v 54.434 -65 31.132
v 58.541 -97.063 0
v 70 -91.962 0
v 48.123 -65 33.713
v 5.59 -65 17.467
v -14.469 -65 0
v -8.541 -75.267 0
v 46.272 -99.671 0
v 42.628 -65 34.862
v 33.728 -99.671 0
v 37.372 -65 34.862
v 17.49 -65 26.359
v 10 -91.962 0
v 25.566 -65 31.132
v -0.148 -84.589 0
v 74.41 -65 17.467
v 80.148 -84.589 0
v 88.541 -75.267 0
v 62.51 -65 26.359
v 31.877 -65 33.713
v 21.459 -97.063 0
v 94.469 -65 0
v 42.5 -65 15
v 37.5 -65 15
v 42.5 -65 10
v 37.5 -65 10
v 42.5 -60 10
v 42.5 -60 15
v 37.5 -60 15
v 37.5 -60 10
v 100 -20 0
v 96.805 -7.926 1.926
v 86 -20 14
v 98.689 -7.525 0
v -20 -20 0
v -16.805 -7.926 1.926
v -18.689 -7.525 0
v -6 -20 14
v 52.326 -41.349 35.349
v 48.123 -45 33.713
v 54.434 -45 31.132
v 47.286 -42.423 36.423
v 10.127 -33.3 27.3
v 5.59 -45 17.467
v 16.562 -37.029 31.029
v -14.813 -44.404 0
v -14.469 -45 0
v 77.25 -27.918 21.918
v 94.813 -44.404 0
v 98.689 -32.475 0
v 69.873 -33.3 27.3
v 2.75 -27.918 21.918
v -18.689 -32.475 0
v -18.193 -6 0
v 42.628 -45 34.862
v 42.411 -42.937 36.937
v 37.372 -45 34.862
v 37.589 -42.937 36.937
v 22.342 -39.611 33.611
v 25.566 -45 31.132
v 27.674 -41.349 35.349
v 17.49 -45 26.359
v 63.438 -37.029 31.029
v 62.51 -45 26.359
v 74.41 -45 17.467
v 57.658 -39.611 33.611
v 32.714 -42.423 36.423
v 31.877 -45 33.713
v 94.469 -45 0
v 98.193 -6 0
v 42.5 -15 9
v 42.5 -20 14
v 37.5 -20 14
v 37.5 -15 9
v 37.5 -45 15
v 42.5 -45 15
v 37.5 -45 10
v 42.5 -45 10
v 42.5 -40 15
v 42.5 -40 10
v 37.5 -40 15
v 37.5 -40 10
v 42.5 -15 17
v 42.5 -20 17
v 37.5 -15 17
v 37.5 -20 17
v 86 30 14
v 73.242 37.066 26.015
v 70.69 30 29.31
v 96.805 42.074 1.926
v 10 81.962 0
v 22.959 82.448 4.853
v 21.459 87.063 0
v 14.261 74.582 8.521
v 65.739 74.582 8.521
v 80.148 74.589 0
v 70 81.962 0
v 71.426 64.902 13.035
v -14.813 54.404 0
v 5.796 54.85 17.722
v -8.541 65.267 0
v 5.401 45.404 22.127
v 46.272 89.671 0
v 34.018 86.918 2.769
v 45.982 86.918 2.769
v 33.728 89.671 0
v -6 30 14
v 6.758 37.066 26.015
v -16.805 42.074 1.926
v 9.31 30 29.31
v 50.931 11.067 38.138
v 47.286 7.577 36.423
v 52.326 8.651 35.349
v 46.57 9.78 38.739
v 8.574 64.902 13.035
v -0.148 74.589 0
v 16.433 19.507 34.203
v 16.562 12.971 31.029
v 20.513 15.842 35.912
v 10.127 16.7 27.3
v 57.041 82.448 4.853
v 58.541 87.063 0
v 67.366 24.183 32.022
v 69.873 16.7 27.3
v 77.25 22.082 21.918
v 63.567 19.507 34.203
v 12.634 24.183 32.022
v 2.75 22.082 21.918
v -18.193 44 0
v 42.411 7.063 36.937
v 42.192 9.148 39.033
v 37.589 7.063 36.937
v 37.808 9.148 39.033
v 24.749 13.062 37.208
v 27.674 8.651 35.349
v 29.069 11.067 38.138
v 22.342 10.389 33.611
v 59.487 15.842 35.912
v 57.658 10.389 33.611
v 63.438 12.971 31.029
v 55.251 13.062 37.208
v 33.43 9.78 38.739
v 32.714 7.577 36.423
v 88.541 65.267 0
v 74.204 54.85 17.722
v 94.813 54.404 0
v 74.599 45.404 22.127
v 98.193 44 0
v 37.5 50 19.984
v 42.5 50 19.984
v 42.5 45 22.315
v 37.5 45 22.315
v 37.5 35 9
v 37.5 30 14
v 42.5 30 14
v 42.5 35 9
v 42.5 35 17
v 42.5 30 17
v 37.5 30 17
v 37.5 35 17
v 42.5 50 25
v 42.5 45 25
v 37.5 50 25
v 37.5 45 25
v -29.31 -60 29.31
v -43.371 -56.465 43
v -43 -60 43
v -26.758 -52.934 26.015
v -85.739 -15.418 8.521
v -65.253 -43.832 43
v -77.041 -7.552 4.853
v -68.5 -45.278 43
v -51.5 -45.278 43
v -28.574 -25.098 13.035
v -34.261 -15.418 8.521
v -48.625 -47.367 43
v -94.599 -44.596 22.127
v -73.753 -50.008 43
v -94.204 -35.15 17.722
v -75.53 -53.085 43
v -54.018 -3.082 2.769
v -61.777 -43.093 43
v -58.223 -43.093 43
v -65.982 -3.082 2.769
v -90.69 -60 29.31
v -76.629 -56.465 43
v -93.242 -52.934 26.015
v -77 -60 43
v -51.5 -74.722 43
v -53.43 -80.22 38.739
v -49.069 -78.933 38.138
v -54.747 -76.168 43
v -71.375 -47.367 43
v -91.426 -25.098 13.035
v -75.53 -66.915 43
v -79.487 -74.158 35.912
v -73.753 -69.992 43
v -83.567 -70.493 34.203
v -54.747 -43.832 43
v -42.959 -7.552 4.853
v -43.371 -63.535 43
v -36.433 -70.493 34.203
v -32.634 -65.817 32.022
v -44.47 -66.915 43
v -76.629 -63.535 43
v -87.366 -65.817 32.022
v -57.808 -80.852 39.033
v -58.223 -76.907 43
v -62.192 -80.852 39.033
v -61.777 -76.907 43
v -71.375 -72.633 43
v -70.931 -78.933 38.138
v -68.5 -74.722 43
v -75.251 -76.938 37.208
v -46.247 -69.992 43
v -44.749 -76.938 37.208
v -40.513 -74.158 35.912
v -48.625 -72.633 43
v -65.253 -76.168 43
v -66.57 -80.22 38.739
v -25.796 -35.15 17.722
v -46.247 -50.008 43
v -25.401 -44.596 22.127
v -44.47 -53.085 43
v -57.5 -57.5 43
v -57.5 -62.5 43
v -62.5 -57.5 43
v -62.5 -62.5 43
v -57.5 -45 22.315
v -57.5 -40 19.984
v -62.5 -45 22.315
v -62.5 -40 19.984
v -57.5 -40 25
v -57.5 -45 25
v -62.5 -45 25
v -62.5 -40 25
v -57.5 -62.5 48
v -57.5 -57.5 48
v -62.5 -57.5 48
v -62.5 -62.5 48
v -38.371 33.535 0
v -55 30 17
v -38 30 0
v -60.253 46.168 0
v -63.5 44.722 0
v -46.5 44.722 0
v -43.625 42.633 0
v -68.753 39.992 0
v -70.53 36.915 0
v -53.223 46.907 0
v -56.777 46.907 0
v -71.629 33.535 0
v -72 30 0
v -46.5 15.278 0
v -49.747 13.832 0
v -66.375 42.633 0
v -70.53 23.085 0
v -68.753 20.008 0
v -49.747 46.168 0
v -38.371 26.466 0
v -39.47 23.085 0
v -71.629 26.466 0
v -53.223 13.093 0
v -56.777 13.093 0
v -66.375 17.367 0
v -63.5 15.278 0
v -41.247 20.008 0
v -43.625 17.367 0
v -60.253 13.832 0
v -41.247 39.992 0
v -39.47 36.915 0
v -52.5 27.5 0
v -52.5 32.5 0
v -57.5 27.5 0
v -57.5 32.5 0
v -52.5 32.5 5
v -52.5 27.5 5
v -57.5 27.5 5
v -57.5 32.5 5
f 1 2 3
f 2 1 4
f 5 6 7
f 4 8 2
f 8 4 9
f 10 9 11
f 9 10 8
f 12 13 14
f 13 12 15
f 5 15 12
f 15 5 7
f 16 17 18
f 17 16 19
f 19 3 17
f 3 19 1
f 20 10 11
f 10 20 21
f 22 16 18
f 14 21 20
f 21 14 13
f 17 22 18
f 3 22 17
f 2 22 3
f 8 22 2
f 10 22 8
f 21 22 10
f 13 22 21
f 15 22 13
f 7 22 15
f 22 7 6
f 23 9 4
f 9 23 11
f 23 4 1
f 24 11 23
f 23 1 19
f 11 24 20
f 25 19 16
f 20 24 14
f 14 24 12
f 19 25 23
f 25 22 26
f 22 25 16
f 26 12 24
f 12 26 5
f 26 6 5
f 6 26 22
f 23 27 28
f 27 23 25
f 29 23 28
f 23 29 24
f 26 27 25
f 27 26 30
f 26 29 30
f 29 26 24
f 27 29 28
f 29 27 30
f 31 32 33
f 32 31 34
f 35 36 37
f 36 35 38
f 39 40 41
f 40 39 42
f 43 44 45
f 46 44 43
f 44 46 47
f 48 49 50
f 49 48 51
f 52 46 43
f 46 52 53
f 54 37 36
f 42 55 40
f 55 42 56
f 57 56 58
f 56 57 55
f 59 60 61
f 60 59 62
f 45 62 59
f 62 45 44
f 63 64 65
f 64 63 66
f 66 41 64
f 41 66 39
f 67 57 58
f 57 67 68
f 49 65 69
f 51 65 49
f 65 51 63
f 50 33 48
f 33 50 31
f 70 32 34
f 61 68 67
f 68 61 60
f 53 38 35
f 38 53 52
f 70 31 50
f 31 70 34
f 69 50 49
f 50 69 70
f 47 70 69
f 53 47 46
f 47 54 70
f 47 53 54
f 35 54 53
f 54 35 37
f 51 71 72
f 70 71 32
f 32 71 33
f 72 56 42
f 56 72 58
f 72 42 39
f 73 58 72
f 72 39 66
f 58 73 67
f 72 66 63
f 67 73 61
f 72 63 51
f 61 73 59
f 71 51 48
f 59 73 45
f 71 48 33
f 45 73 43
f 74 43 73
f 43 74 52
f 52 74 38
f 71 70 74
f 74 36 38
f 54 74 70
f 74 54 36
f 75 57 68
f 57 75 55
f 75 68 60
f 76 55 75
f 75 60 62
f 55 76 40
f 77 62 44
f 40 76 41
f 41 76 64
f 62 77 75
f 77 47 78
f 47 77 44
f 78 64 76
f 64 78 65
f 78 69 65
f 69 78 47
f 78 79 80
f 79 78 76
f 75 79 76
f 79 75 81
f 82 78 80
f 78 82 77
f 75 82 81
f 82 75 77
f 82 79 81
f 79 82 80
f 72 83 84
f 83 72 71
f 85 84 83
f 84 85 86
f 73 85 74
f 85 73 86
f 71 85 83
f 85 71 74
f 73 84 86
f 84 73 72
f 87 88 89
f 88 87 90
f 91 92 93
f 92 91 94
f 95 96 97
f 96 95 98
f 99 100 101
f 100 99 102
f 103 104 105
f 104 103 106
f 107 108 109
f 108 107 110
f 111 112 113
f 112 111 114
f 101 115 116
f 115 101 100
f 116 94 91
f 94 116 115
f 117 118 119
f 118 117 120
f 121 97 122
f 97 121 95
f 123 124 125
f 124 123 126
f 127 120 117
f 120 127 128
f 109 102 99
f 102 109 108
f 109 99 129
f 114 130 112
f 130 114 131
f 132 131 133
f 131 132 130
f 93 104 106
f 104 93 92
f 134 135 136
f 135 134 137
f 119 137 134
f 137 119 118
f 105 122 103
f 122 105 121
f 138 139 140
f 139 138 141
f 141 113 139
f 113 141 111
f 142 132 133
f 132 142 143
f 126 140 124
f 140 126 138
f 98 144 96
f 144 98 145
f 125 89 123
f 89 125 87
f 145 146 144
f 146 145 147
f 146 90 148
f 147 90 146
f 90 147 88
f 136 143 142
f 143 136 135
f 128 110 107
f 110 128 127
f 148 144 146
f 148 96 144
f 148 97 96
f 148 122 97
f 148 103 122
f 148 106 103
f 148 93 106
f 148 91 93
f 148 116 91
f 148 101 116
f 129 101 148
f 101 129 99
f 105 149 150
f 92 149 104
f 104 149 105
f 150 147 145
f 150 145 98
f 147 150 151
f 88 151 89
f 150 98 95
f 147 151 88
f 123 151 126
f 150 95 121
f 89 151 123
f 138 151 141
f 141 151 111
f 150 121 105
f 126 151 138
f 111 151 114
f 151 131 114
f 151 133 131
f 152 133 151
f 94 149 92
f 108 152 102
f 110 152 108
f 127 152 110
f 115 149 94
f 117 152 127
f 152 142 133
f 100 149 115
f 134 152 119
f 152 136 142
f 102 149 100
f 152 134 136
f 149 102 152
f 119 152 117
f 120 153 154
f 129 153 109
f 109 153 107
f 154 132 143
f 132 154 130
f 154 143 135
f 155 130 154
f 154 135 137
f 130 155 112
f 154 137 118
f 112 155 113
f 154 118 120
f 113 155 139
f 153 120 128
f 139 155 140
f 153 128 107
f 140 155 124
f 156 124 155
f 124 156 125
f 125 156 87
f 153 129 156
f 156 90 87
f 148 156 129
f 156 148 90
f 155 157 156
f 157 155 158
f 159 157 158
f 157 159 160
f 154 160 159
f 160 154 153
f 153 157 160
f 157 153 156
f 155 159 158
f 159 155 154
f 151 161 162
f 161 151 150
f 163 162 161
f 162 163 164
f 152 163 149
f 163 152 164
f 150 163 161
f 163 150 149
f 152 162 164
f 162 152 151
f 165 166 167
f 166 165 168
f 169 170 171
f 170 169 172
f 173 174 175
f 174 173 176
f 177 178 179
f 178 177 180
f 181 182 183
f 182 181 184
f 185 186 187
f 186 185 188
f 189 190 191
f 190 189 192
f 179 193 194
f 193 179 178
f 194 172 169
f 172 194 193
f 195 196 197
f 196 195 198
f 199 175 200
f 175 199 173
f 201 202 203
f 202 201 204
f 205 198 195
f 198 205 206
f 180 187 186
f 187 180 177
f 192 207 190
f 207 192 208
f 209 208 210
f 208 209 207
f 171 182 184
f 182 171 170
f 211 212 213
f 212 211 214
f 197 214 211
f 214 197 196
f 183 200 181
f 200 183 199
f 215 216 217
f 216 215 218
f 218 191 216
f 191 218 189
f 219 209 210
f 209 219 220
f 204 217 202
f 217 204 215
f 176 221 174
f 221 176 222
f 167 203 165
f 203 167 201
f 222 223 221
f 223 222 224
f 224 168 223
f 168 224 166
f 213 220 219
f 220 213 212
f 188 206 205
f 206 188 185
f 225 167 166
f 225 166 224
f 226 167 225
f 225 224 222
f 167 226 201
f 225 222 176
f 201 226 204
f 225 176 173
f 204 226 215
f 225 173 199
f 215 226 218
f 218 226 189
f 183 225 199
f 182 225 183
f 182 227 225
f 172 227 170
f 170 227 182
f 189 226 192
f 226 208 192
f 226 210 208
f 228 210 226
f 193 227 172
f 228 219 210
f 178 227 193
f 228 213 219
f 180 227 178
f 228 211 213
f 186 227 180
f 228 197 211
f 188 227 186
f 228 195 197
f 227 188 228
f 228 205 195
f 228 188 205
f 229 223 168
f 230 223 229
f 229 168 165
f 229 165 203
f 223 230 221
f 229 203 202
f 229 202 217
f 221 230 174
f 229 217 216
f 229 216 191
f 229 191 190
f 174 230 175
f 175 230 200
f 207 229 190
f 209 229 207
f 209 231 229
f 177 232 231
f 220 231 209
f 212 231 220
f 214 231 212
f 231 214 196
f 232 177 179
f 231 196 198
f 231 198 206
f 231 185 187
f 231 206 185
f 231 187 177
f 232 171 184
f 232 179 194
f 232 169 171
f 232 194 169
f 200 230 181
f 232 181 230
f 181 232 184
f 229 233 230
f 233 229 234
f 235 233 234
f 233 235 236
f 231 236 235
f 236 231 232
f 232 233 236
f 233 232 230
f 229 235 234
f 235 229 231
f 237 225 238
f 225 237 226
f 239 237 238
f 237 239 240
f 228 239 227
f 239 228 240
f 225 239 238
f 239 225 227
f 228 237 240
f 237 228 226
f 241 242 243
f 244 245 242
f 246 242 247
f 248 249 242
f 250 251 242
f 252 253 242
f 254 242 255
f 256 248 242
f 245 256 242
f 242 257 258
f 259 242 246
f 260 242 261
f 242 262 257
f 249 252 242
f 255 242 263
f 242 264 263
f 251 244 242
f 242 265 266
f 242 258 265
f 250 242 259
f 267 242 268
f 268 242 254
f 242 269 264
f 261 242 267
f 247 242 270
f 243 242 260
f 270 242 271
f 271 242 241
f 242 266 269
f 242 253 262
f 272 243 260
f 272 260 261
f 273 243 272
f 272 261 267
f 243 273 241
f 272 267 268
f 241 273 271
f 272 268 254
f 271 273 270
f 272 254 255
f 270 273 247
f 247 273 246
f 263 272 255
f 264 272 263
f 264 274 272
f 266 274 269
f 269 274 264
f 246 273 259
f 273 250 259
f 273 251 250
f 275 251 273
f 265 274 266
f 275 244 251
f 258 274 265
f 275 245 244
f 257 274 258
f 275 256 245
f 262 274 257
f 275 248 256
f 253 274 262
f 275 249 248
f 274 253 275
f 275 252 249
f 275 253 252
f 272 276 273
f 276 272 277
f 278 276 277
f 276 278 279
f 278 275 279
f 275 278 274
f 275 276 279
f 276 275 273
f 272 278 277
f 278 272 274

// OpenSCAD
translate([40,-40,0]){
    difference(){
        cylinder(r1 = 60, r2 = 0, h = 60);
        
        //hyperbel
        translate([-65,-25,-1])
                cube([130,130,130]);
        
        
    }
    translate([-2.5,-25,10])
        cube([5,5,5]);
}

translate([40,-20,0]){
    difference(){
        cylinder(r1 = 60, r2 = 0, h = 60);
        
        //parabel
        translate([-65,15,-1])
            rotate([45,0,0])
                translate([0,0,-35])
                cube([130,130,130]);
        translate([-65,-25-130,-1])
                cube([130,130,130]);
        translate([-2.5,-26,10])
            cube([5,6,5]);
        
        
    }
    translate([-2.5,0,5])
        cube([5,5,12]);
}
translate([40,30,0]){
    difference(){
        cylinder(r1 = 60, r2 = 0, h = 60);
        
        //ellipse
        translate([-65,65,-1])
            rotate([65,0,0])
                translate([0,0,0])
                cube([130,130,130]);
        
        translate([-65,15,-1])
            rotate([45,0,0])
                translate([0,-130,0])
                cube([130,130,130]);
        translate([-2.5,0,5])
            cube([5,5,12]);
        
    
    }
    translate([-2.5,15,15])
        cube([5,5,10]);
}
translate([-60,-60,0]){
    difference(){
        cylinder(r1 = 60, r2 = 0, h = 60);
        //cirkel
        translate([-65,-65,43])
            rotate([0,0,0])
                translate([0,0,0])
                cube([130,130,130]);
        translate([-65,65,-1])
            rotate([65,0,0])
                translate([0,-130,0])
                    cube([130,130,130]);
        translate([-2.5,15,15])
            cube([5,5,10]);

    }
    translate([-2.5,-2.5,43])
        cube([5,5,5]);
}

translate([-55,30,-43]){
    difference(){
        cylinder(r1 = 60, r2 = 0, h = 60);
        //cirkel
        *translate([0,15,15])
            cube([5,5,10]);
        
        translate([-65,-65,43])
            rotate([0,0,0])
                translate([0,0,-130])
                cube([130,130,130]);
        translate([-2.5,-2.5,42])
            cube([5,5,6]);
}
}
